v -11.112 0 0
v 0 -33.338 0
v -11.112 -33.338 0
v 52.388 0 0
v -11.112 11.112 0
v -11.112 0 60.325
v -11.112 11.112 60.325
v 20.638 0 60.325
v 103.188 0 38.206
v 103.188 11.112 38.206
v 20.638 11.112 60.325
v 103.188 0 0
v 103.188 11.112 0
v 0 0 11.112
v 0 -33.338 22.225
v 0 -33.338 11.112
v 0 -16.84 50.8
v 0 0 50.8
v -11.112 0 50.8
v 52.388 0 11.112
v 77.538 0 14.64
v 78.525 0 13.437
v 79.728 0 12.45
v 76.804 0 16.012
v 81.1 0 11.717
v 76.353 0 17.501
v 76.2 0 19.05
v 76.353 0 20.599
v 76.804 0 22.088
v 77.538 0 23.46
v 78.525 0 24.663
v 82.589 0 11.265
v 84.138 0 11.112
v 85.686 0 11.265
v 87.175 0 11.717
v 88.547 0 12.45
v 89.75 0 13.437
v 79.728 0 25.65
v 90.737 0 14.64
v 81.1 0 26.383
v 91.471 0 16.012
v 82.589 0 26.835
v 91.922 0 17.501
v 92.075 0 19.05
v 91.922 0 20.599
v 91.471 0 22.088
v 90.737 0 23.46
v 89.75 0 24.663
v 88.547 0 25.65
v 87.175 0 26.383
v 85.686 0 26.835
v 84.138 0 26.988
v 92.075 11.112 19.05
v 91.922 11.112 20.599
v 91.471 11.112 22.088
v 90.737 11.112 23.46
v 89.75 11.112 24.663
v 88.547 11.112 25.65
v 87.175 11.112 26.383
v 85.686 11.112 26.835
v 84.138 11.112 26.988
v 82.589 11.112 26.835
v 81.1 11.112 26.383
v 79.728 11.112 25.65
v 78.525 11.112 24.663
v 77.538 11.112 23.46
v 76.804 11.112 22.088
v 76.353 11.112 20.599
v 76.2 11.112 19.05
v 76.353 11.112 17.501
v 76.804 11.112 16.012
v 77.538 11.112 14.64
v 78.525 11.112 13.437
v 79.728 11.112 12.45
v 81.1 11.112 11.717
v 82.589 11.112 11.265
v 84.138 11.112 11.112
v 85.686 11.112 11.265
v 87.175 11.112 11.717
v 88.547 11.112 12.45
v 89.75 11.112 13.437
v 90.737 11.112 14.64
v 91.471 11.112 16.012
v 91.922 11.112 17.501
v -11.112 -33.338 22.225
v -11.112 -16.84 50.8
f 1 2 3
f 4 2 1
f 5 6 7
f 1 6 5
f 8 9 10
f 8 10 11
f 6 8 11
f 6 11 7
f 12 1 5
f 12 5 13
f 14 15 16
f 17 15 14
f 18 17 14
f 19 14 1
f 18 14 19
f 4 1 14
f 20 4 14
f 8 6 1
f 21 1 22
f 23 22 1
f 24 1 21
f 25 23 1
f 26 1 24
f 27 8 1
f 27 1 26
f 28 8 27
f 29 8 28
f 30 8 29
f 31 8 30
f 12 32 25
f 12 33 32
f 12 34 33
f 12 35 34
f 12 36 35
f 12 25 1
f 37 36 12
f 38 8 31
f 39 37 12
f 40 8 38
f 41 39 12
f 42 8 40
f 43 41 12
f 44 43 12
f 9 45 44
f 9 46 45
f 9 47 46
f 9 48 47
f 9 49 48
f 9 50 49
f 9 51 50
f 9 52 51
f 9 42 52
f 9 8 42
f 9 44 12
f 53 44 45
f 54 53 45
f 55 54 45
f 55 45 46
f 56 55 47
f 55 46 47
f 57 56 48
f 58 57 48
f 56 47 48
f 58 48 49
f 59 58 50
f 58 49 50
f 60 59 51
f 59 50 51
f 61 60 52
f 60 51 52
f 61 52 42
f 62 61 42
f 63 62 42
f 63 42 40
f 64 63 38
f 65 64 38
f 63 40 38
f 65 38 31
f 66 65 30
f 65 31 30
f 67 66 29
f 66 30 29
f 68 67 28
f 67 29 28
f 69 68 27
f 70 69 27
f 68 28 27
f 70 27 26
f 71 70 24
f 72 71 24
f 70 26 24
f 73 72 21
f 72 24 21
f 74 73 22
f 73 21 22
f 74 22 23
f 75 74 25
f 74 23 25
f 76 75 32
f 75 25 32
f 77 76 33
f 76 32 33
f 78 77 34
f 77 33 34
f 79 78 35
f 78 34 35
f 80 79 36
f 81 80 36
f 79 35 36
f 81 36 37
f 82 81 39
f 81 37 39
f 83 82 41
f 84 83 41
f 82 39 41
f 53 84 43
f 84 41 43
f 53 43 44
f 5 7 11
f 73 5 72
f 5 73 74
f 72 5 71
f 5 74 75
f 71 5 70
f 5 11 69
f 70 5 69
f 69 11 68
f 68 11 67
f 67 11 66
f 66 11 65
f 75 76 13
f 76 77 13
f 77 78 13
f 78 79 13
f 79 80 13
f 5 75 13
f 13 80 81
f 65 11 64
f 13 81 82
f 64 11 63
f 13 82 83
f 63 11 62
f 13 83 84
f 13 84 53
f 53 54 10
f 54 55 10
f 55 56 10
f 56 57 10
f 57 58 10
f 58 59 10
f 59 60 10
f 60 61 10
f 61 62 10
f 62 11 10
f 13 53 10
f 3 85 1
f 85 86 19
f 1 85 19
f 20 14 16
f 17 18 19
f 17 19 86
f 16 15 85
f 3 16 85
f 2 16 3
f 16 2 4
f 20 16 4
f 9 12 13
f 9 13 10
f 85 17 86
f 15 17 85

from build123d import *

# Parameters (mm, degrees)
F3_DEPTH = 11.1125
F4_DEPTH = 11.1125
F2_R     = 7.9375
F5_DEPTH = 11.1125


with BuildPart() as f3:
    # F0 (on Top) → F3 (new body)
    with BuildSketch(Plane.XY):
        Polygon((52.3875, 0), (0, 0), (0, -33.3375), align=None)
    extrude(amount=F3_DEPTH)

    # F1 (on Right) → F4 (join)
    with BuildSketch(Plane.YZ):
        Polygon((-33.3375, 0), (0, 0), (0, 50.8), (-16.839716, 50.8), (-33.3375, 22.225), align=None)
    extrude(amount=-F4_DEPTH)


with BuildPart() as f5:
    # F2 (on Front) → F5 (new body)
    with BuildSketch(Plane.XZ):
        Polygon((20.6375, 60.325), (-11.1125, 60.325), (-11.1125, 0), (103.1875, 0), (103.1875, 38.205794), align=None)
        with Locations((84.1375, 19.05)):
            Circle(F2_R, mode=Mode.SUBTRACT)
    extrude(amount=-F5_DEPTH)


solid = Compound([f3.part, f5.part])
